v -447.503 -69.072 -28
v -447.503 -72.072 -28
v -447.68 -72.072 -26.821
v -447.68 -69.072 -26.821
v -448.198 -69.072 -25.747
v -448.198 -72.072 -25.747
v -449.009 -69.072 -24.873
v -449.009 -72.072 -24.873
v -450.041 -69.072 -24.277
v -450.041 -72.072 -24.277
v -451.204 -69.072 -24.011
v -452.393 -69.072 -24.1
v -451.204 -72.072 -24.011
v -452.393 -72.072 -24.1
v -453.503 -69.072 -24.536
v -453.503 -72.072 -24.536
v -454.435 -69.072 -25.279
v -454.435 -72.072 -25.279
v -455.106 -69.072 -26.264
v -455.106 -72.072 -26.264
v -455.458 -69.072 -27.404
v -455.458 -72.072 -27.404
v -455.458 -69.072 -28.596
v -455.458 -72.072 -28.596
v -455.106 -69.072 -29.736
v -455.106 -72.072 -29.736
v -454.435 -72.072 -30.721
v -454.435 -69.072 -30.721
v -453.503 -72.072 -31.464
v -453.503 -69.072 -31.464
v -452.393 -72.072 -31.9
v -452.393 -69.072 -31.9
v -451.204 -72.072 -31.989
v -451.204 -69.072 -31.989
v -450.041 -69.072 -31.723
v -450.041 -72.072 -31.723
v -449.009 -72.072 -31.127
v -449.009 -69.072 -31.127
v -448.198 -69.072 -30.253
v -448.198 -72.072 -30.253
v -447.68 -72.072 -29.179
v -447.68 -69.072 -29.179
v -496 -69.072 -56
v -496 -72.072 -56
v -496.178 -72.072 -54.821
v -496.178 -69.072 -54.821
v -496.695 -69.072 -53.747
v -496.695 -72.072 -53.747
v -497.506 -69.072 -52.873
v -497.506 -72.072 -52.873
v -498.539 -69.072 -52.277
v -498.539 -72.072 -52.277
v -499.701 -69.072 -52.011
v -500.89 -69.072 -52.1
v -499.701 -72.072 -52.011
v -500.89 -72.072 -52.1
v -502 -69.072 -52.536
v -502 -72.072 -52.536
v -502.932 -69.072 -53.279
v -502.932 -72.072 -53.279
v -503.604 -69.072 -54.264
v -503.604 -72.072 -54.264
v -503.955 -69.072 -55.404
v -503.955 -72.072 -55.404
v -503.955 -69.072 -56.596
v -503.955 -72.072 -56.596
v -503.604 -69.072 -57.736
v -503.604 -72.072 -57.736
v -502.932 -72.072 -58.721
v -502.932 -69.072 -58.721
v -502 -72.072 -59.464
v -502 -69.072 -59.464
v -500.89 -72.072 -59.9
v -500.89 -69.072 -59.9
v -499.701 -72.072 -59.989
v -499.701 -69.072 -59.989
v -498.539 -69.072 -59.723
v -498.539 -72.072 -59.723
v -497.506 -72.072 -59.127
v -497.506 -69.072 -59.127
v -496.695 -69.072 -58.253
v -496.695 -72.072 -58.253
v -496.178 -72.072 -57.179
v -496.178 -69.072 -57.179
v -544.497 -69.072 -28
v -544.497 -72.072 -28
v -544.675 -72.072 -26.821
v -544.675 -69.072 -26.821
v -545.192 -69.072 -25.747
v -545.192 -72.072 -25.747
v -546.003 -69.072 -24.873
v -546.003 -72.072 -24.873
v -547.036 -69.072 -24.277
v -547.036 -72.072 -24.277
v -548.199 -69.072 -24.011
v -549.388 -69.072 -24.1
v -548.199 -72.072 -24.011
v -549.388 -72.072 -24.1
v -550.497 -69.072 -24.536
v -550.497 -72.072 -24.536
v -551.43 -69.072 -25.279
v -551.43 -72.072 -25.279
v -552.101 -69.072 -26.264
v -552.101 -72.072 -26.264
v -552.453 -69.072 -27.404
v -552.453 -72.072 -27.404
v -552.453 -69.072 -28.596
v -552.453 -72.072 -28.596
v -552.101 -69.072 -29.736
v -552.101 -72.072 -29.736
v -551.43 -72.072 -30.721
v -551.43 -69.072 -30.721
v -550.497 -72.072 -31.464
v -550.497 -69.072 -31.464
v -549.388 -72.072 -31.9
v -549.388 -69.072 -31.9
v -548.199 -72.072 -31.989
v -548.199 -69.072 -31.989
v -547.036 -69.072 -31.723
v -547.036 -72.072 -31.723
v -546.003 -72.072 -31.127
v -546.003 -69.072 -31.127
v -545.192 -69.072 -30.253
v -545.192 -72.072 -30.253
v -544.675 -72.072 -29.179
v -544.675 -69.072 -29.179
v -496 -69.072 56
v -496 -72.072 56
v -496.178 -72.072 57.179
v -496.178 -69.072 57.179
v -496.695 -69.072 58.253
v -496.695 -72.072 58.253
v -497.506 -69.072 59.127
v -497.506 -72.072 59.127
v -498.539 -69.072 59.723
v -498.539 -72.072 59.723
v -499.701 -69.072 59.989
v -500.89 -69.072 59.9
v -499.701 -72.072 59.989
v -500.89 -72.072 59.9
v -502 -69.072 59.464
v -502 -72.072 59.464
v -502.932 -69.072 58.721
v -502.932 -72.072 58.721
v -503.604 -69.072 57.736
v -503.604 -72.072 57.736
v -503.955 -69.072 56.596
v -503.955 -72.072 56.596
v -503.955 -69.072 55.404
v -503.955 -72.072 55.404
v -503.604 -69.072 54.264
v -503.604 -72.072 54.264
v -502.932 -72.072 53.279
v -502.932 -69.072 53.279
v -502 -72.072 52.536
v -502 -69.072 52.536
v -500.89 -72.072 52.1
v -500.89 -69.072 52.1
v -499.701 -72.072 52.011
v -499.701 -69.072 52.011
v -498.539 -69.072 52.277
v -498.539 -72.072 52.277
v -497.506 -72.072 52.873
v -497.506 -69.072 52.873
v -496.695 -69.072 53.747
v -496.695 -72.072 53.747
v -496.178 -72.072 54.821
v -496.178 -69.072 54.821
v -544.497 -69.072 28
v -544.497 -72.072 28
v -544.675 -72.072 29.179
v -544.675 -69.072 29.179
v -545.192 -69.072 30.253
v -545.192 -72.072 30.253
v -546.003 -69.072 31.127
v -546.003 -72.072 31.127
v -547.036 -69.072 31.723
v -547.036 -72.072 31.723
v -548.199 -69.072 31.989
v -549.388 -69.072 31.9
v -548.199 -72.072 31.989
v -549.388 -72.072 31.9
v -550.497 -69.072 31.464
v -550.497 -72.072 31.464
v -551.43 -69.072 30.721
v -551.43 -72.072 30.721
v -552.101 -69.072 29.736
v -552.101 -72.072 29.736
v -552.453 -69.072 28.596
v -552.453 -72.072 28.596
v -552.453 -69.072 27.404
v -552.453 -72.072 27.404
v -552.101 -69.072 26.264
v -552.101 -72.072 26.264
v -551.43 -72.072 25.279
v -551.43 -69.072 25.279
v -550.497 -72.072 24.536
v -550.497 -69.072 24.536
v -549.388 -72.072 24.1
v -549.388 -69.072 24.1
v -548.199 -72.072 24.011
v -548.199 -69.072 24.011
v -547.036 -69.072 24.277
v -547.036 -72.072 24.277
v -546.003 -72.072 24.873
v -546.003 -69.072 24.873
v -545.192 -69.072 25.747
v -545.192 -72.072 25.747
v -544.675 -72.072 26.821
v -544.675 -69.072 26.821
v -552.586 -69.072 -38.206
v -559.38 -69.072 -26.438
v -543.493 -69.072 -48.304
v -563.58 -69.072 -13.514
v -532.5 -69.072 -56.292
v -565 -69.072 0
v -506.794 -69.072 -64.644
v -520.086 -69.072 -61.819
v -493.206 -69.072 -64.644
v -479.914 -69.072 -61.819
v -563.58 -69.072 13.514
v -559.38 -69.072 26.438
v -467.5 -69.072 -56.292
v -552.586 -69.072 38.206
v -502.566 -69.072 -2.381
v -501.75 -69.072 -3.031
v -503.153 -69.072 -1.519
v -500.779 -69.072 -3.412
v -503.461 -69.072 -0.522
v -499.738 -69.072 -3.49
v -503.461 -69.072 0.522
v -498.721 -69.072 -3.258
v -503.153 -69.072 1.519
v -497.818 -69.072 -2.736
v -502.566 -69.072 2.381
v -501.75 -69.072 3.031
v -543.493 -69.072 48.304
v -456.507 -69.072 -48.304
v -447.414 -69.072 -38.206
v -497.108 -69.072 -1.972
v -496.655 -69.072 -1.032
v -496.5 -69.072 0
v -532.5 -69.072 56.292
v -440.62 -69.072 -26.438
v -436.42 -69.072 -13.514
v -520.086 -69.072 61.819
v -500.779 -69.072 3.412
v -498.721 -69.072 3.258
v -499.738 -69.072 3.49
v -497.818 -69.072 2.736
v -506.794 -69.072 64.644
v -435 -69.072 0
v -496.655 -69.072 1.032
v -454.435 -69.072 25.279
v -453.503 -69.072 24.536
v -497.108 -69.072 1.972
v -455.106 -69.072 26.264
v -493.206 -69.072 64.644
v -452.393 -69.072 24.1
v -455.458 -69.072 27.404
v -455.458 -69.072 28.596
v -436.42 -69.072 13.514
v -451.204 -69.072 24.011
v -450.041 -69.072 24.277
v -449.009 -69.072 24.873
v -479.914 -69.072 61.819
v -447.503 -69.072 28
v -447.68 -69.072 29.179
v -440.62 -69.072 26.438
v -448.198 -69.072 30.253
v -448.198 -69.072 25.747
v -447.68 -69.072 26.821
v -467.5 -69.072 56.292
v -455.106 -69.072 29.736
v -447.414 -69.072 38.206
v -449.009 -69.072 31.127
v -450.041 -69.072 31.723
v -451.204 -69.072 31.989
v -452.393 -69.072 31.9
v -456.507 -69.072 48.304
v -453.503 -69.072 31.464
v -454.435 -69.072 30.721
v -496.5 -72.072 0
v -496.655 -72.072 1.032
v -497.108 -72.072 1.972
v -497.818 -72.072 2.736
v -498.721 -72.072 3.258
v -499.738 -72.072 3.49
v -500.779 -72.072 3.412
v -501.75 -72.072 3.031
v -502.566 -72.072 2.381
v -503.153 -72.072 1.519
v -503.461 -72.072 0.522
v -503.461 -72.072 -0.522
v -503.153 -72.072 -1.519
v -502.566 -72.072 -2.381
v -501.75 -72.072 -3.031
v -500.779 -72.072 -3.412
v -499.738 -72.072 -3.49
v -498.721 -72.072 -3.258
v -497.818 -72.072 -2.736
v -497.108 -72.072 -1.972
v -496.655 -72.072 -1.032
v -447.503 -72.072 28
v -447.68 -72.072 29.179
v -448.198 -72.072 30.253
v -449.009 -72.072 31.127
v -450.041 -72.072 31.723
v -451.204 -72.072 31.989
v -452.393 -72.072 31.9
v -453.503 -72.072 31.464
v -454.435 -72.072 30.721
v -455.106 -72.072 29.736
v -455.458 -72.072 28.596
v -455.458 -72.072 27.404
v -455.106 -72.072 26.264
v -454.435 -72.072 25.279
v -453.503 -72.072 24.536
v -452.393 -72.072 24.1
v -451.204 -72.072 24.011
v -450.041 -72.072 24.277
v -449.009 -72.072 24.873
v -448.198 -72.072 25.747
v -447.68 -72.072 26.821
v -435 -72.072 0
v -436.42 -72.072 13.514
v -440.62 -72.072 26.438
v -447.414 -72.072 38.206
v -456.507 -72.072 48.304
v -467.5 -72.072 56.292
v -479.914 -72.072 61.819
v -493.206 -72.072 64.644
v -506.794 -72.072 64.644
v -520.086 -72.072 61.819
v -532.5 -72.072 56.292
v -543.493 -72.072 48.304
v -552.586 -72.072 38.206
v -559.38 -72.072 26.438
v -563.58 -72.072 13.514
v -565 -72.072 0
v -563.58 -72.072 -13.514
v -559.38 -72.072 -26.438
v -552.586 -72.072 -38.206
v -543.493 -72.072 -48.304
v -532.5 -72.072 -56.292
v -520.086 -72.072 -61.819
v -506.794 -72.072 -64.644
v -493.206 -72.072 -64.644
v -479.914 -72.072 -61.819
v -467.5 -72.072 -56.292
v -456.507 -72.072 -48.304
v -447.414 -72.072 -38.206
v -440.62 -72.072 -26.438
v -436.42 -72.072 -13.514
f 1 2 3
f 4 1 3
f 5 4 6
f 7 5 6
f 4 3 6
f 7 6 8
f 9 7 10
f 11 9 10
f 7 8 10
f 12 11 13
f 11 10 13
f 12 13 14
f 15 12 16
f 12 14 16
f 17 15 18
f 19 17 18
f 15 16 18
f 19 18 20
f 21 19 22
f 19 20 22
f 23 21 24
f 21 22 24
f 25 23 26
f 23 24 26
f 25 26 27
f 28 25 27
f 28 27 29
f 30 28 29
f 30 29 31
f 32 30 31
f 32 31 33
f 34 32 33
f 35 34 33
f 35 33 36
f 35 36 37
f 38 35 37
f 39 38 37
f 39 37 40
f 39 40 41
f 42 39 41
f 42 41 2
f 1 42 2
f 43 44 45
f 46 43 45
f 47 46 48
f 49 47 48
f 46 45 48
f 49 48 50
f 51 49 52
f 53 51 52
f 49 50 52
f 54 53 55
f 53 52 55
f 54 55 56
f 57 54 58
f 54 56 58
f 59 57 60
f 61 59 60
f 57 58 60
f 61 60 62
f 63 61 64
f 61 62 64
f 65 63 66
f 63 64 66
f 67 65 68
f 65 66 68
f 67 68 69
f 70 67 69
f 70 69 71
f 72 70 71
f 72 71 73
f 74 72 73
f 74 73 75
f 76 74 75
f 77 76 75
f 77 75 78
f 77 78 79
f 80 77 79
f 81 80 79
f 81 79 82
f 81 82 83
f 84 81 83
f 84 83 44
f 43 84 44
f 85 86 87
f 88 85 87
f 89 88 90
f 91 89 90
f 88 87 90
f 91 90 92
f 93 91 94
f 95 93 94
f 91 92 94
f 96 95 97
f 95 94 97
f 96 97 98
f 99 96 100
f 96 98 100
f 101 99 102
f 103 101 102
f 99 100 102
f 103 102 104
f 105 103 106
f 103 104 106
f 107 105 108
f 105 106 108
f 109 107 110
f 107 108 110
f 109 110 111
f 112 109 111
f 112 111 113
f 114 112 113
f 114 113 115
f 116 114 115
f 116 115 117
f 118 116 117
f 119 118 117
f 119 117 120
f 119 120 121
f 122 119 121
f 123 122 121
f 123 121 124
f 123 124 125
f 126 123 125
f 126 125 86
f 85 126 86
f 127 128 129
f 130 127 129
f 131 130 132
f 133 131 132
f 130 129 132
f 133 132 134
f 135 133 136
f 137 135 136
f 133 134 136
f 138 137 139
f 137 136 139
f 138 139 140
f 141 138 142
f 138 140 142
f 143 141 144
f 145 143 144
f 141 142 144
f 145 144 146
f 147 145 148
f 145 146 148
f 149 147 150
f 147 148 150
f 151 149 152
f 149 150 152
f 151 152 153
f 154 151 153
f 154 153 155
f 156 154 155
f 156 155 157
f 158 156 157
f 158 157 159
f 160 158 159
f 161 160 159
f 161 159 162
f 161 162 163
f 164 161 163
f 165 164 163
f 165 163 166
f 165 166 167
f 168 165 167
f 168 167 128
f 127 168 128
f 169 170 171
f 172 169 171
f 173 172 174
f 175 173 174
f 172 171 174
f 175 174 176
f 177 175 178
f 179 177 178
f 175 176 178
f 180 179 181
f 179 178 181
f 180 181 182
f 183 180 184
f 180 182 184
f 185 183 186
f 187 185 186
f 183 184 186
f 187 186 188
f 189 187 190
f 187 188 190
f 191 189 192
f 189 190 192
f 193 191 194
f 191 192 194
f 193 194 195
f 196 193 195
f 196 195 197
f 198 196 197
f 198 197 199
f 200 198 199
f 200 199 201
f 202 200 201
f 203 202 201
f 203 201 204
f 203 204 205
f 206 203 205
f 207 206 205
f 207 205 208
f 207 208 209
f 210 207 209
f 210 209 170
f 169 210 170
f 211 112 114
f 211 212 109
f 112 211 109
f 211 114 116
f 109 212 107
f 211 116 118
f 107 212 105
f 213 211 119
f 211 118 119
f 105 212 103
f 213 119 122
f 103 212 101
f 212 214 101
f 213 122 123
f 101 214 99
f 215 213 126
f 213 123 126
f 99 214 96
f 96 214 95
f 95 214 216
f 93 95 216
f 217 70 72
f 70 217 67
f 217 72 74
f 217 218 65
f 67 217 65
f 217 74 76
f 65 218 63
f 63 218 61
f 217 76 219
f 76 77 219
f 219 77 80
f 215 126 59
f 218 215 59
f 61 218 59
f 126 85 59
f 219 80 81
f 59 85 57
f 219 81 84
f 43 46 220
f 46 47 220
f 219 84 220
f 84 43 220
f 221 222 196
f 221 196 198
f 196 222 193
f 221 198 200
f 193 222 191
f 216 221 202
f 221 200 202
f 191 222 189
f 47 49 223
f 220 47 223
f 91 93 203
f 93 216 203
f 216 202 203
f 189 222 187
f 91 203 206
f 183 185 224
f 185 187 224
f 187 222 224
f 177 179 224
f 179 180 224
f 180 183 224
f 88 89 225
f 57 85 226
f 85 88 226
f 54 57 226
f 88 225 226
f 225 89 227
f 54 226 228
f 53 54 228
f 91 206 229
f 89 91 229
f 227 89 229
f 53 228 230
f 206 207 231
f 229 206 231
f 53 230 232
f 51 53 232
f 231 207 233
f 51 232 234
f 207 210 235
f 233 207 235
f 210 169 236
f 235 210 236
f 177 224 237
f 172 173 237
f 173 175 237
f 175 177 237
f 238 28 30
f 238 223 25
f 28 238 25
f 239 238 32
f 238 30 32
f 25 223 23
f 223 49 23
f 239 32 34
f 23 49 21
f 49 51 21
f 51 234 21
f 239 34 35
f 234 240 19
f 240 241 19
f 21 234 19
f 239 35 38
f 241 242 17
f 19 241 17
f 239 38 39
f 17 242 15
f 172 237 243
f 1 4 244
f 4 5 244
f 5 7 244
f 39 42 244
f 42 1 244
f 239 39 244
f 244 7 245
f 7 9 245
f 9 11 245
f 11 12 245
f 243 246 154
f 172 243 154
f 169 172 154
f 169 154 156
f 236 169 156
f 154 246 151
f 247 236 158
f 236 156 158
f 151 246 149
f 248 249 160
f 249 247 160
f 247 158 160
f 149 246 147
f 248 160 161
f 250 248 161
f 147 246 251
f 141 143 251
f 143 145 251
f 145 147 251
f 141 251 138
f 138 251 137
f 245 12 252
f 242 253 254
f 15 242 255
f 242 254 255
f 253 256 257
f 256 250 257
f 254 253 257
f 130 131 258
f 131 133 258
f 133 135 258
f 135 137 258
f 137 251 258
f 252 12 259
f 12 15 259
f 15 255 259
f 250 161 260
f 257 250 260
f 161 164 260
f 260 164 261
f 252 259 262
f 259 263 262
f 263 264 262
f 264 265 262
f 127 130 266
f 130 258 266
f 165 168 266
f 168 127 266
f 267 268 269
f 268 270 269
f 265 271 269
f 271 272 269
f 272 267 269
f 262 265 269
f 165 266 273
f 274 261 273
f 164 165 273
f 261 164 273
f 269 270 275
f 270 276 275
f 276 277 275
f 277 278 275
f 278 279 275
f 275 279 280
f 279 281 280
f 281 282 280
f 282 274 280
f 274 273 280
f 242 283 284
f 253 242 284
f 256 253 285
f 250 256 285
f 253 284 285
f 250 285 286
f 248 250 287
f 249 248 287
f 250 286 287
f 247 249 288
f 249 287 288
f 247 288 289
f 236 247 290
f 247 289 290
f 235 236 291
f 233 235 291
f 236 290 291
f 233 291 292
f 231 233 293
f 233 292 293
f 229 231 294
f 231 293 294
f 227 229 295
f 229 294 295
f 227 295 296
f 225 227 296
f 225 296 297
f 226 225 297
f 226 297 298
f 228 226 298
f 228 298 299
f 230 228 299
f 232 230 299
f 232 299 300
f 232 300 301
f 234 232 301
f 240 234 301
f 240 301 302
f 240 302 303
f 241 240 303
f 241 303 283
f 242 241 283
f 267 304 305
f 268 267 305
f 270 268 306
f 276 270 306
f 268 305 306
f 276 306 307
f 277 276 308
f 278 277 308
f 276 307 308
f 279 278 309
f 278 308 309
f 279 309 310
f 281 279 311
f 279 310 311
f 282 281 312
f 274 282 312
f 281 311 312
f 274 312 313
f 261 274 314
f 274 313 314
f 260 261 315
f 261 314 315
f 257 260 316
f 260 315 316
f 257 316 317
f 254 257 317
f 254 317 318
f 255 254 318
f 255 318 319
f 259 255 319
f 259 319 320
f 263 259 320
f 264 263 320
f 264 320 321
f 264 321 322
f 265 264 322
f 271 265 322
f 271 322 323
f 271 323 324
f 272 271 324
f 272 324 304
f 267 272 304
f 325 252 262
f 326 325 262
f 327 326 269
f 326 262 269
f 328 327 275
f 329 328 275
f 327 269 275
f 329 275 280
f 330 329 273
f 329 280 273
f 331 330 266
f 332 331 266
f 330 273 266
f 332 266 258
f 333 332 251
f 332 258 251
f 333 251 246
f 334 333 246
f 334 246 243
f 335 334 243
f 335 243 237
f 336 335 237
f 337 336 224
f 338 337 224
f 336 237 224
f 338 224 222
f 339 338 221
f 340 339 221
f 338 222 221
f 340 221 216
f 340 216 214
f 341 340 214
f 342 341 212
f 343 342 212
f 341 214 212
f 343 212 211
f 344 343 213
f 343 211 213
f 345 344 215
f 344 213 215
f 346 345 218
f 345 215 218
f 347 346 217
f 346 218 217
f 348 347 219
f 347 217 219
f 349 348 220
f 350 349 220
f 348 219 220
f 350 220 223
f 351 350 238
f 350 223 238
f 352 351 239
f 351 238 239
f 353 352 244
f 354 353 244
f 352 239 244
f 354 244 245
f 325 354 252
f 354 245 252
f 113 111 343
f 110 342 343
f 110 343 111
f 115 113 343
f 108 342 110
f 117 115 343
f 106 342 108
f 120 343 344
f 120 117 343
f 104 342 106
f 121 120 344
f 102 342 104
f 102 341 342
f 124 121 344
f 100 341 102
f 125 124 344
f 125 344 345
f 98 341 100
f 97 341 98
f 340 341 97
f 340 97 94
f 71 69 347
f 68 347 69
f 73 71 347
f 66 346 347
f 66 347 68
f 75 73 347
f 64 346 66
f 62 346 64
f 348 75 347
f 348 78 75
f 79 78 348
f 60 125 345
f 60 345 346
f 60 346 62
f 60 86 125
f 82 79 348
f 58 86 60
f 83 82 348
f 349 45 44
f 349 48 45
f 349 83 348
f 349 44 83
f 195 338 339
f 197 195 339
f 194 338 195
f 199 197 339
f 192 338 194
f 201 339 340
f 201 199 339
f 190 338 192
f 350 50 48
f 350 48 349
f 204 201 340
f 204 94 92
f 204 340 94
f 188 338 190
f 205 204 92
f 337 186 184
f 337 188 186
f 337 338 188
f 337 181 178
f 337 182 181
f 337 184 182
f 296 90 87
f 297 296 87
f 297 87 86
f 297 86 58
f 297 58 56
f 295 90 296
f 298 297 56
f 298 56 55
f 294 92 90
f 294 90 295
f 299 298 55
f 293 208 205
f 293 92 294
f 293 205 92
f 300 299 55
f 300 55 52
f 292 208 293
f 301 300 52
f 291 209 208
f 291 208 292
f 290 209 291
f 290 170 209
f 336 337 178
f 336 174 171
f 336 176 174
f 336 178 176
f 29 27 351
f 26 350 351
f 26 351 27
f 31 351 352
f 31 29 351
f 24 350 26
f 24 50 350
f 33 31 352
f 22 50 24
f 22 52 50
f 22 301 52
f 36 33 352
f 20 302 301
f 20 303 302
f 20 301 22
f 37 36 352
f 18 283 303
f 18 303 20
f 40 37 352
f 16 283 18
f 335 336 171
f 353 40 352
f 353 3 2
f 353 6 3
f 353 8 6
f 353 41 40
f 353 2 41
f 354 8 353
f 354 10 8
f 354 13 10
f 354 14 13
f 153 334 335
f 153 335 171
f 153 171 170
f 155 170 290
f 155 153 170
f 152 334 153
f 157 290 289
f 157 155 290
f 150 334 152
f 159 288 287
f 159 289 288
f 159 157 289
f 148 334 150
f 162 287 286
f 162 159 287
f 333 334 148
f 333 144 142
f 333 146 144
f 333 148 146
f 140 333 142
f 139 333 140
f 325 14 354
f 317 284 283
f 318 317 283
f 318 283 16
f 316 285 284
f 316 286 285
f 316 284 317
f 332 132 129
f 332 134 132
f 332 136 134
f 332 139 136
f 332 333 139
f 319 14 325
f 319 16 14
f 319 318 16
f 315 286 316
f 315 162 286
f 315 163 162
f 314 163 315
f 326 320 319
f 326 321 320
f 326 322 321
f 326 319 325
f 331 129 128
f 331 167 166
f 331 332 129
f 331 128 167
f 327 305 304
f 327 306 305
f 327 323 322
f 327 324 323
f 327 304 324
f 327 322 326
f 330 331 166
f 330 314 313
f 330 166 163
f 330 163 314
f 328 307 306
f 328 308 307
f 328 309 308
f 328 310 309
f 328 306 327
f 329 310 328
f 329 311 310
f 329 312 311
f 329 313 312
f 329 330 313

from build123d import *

# Parameters (mm, degrees)
SKETCH005_R     = 65
PAD004_DEPTH    = 3
SKETCH006_R     = 4
POCKET_DEPTH    = 3.001
SKETCH011_R     = 3.5
POCKET002_DEPTH = 3.001


with BuildPart() as part:
    # Sketch005 → Pad004 (new body)
    with BuildSketch(Plane(origin=(500, 72.072, 0), x_dir=(1, 0, 0), z_dir=(0, -1, 0))):
        Circle(SKETCH005_R)
    extrude(amount=PAD004_DEPTH)

    # Sketch006 → Pocket (cut, through all)
    with BuildSketch(Plane(origin=(500, 69.072, 0), x_dir=(1, 0, 0), z_dir=(0, -1, 0))):
        with Locations((48.497423, 28)):
            Circle(SKETCH006_R)
        with Locations((48.497423, -28)):
            Circle(SKETCH006_R)
        with Locations((0, -56)):
            Circle(SKETCH006_R)
        with Locations((-48.497423, -28)):
            Circle(SKETCH006_R)
        with Locations((-48.497423, 28)):
            Circle(SKETCH006_R)
        with Locations((0, 56)):
            Circle(SKETCH006_R)
    extrude(amount=-POCKET_DEPTH, mode=Mode.SUBTRACT)


with BuildPart() as part_1:
    # Clone008 placement: moved
    add(part.part.moved(Location((-1000, -141.144, 0))))

    # Sketch011 → Pocket002 (cut, through all)
    with BuildSketch(Plane(origin=(-500, -72.072, 0), x_dir=(1, 0, 0), z_dir=(0, -1, 0))):
        Circle(SKETCH011_R)
    extrude(amount=-POCKET002_DEPTH, mode=Mode.SUBTRACT)


solid = part_1.part
